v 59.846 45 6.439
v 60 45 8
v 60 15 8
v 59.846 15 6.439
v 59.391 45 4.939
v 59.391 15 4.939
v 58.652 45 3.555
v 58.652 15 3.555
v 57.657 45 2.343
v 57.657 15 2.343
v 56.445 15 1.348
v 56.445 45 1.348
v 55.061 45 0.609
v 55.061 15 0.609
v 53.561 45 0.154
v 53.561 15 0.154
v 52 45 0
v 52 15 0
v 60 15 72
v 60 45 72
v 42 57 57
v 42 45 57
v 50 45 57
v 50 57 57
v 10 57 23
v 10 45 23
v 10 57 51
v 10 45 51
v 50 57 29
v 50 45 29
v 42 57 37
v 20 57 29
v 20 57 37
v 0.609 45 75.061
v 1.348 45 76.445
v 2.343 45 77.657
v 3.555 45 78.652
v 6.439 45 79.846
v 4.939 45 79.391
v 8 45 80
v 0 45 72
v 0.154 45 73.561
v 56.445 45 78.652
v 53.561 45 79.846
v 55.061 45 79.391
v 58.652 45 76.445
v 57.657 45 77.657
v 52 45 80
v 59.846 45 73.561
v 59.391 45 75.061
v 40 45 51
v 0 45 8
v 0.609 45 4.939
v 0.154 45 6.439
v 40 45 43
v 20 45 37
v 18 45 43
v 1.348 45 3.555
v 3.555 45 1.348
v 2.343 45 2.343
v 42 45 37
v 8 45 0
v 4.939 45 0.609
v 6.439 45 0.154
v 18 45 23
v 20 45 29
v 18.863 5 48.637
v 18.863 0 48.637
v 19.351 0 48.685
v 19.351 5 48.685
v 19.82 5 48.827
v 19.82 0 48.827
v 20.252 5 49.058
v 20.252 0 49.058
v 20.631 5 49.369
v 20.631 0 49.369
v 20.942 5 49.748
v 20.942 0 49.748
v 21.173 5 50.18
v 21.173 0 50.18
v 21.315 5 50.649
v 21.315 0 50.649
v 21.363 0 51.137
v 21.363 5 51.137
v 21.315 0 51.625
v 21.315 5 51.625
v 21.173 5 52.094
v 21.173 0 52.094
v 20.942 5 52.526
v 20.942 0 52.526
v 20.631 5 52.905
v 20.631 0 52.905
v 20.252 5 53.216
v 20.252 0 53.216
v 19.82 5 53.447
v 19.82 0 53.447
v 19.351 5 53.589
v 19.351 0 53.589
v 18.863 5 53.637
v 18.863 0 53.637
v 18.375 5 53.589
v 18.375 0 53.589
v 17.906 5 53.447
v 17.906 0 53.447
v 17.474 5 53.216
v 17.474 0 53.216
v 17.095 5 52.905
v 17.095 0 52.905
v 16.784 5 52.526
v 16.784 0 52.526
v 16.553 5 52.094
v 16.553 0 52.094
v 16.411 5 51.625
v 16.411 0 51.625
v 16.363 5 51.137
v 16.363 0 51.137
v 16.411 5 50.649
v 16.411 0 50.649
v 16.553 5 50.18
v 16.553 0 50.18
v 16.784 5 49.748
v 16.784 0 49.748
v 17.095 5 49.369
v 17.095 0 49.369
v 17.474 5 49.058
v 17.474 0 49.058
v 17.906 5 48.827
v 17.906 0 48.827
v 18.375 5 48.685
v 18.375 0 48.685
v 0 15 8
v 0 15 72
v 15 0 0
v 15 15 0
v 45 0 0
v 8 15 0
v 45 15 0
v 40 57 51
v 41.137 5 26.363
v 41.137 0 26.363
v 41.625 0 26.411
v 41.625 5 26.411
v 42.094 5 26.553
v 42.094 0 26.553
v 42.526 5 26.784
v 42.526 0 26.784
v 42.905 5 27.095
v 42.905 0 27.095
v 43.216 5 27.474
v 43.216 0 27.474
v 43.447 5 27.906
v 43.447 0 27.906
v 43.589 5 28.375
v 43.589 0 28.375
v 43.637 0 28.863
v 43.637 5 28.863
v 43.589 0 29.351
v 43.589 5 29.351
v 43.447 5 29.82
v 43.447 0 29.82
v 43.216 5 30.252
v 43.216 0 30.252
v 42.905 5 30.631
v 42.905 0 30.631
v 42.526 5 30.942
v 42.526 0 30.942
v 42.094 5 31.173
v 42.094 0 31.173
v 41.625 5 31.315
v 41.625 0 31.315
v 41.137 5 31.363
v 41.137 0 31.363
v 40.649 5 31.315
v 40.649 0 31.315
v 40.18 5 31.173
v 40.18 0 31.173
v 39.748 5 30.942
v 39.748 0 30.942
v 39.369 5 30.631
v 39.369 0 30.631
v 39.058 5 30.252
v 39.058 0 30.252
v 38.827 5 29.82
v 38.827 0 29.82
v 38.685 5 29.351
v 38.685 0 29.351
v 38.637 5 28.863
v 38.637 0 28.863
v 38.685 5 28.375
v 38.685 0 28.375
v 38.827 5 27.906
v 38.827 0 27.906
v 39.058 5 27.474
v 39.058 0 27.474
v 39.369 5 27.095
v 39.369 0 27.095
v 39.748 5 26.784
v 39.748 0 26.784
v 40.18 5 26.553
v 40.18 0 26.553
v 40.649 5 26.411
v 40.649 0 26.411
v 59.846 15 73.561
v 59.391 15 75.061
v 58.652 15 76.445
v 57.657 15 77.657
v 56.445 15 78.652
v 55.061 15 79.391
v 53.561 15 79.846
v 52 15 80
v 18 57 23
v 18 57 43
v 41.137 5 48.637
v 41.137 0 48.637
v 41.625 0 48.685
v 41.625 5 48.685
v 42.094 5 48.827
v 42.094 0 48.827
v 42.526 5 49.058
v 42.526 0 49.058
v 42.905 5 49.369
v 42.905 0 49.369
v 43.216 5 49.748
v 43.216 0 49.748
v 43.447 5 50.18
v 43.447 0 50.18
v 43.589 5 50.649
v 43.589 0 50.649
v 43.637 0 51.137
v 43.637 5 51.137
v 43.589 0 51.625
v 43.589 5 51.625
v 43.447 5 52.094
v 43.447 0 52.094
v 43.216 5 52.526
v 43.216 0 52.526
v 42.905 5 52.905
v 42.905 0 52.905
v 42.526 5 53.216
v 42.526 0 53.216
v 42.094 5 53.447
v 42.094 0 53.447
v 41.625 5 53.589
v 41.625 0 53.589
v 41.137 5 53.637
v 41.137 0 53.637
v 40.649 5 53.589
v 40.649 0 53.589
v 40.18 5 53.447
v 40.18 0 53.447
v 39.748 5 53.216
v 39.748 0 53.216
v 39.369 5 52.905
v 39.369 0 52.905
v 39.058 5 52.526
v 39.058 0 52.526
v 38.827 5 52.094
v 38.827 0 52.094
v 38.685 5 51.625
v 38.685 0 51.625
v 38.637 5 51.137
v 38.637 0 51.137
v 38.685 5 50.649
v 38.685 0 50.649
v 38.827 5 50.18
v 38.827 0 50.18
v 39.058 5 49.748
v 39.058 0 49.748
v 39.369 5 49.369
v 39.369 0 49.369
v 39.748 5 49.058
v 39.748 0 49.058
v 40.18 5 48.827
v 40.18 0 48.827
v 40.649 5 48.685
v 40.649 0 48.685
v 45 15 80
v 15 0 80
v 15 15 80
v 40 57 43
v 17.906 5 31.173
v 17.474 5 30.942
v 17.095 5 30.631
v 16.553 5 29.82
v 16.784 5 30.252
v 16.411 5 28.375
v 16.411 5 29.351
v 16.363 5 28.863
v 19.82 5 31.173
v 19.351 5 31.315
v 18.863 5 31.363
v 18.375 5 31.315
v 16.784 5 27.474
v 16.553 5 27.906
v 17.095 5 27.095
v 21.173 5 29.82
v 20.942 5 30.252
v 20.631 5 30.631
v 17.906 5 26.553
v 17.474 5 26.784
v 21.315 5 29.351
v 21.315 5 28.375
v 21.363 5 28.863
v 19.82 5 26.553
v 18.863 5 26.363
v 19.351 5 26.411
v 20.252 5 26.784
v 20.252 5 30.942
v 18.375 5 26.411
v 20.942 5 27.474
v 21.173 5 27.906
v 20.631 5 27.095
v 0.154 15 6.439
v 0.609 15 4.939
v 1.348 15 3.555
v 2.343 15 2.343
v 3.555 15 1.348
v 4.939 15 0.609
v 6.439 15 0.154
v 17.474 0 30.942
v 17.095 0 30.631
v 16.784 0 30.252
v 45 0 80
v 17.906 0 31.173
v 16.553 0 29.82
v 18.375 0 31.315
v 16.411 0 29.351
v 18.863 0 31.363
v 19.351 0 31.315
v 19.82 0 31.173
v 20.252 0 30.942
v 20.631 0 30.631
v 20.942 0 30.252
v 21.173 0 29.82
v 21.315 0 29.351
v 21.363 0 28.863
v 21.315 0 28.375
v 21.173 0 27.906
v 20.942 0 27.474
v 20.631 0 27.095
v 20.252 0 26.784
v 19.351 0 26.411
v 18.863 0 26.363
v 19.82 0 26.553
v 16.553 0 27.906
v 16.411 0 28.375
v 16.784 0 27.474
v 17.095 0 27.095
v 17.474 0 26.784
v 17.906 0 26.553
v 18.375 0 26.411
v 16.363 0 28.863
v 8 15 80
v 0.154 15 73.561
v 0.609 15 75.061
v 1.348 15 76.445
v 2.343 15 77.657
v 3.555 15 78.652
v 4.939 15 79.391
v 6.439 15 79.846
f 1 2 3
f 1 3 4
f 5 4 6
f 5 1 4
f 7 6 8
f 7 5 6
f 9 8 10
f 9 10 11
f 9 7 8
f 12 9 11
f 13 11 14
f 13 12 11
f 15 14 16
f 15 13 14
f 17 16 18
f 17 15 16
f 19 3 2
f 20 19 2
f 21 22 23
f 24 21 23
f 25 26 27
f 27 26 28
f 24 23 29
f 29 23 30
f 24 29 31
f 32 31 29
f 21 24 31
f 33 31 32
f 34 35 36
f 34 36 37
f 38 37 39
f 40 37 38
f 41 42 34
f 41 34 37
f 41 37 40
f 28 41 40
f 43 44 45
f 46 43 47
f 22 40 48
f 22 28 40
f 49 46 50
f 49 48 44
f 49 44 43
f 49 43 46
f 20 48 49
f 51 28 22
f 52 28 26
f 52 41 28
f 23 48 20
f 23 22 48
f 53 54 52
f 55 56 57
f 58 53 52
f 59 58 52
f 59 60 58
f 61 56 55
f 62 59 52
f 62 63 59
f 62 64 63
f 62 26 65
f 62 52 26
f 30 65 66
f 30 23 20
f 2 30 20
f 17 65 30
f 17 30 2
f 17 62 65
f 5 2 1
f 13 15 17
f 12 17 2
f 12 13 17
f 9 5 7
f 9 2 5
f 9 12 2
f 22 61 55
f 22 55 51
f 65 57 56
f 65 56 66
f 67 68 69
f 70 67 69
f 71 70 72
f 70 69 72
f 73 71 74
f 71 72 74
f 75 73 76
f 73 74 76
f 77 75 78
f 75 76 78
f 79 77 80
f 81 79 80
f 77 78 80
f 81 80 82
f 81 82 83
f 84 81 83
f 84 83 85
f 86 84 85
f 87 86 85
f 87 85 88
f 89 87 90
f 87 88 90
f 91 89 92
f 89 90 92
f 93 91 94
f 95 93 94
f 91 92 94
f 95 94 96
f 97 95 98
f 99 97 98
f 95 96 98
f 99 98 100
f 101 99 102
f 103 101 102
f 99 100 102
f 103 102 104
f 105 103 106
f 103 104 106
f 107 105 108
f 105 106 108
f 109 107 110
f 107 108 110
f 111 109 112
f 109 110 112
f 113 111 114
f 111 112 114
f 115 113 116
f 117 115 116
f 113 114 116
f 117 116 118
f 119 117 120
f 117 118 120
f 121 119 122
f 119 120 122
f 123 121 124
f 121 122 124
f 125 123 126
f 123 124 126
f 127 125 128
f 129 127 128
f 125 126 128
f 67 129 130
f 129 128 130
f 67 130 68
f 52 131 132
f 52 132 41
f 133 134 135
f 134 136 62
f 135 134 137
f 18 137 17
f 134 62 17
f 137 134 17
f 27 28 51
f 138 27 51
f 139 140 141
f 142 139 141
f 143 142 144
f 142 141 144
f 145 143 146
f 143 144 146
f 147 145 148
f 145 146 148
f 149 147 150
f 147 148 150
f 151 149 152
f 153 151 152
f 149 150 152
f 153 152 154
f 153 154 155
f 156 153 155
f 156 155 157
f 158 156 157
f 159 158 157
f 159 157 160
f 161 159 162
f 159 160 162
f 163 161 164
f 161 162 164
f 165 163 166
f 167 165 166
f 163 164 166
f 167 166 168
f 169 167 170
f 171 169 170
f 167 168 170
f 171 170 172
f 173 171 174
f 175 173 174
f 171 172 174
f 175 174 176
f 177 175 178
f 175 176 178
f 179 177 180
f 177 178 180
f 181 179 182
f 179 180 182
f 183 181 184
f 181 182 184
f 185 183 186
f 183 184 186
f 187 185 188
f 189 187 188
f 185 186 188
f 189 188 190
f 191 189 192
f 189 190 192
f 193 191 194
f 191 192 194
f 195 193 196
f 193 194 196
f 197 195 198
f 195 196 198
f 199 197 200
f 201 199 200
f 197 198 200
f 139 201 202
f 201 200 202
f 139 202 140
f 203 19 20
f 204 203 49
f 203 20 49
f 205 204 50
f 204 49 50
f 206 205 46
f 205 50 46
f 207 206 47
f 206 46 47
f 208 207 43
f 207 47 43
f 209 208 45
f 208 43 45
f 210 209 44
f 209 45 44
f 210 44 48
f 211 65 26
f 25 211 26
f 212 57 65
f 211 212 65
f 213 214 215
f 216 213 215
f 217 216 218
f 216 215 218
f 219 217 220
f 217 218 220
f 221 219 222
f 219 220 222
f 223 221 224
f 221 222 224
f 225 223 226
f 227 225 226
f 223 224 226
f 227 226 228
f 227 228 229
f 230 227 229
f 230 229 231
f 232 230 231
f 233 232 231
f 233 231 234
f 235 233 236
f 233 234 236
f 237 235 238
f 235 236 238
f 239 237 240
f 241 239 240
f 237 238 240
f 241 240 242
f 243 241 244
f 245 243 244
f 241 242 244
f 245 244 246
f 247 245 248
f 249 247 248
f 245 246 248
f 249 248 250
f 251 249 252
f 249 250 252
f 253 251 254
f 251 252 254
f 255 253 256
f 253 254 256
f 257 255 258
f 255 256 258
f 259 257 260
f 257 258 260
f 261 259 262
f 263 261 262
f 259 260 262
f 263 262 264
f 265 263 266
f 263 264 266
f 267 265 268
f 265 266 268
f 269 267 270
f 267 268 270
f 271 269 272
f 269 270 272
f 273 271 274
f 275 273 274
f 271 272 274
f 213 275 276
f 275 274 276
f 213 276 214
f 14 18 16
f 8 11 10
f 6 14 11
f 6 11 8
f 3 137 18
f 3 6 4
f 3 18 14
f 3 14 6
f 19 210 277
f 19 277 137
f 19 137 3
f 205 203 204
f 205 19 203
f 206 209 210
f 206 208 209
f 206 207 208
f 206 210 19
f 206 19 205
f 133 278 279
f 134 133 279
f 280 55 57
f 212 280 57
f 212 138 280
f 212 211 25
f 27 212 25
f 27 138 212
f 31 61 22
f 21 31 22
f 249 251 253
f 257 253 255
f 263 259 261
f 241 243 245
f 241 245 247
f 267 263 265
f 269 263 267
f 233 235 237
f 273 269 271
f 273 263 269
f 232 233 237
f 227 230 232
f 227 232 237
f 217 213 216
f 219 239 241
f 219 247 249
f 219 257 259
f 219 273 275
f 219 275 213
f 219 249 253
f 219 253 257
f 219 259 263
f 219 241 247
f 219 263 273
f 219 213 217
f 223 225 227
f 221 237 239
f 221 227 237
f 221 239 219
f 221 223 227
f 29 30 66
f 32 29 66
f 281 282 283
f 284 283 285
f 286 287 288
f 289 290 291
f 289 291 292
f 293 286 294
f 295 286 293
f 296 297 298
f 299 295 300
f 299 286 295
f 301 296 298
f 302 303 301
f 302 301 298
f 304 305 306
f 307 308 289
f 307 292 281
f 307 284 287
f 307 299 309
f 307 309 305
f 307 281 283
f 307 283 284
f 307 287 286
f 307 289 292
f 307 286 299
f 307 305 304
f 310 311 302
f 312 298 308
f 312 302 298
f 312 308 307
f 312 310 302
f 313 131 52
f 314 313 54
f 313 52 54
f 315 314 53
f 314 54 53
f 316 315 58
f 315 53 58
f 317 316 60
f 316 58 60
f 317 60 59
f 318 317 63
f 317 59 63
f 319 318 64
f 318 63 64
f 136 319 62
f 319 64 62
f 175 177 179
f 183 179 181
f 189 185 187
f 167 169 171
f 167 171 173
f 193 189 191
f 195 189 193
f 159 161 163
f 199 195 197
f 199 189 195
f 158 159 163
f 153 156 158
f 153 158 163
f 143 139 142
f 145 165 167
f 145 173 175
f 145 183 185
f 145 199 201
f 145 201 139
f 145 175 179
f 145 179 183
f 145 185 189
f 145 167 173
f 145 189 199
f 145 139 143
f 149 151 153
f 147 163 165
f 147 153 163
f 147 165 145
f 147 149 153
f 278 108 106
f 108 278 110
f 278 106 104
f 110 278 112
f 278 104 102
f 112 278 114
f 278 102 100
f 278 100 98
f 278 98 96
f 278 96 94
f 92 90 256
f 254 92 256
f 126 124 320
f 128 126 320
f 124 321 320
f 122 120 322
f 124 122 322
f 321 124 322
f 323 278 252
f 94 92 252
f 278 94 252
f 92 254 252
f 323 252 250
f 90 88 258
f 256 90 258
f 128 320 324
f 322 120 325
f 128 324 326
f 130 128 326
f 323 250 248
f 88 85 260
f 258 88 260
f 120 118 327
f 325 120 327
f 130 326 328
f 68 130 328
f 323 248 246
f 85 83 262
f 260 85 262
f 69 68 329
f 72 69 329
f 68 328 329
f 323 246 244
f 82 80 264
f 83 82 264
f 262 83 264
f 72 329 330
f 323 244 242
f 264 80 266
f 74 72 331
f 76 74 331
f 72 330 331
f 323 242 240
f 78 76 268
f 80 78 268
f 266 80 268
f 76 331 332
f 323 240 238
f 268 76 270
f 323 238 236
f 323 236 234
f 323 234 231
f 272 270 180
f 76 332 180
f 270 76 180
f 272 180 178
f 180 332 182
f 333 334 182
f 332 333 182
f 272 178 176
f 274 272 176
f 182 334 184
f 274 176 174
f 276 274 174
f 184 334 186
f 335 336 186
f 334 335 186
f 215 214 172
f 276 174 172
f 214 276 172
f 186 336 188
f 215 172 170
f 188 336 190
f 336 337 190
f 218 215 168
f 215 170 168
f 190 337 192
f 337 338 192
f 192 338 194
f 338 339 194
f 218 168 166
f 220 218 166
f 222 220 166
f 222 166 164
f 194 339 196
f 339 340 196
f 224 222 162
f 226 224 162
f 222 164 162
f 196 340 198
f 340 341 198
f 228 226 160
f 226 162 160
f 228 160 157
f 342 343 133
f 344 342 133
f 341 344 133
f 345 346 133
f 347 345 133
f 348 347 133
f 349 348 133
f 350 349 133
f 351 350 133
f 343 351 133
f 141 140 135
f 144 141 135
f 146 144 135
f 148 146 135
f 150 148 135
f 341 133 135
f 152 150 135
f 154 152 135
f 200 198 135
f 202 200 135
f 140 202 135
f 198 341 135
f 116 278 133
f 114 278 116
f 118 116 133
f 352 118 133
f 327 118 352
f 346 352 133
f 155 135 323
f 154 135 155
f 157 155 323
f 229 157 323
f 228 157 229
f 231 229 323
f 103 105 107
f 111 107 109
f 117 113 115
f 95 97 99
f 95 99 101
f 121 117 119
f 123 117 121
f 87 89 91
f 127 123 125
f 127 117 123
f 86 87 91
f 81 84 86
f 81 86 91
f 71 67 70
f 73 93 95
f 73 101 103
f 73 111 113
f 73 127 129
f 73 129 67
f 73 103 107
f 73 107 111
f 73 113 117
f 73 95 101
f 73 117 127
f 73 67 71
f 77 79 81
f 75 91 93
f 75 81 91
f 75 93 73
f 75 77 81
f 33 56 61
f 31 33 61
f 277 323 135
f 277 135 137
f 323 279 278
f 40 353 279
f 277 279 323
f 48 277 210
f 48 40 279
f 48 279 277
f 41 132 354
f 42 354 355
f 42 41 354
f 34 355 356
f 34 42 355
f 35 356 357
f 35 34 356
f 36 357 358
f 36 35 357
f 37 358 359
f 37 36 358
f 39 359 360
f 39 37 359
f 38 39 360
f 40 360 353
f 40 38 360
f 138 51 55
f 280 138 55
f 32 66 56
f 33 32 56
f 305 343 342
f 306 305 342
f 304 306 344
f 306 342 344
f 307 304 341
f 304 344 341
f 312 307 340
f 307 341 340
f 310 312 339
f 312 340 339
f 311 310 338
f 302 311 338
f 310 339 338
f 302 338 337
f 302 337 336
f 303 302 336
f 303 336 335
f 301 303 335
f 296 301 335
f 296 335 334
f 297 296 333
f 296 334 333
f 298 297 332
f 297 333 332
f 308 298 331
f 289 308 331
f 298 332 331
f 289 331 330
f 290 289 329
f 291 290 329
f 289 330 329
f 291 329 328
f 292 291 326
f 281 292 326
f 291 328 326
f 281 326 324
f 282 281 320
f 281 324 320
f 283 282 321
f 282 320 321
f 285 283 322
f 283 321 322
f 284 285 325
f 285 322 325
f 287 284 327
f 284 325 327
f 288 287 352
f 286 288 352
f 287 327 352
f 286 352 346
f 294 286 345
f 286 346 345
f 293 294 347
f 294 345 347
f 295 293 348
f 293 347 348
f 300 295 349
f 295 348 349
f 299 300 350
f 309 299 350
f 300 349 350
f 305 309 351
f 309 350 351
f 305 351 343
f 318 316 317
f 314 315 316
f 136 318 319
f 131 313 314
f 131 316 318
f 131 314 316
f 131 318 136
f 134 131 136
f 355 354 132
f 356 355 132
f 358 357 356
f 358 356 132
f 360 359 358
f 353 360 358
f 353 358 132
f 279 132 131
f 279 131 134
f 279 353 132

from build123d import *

# Parameters (mm, degrees)
SKETCH_1_W          = 60
SKETCH_1_H          = 45
EXTRUDE_1_DEPTH     = 80
FILLET_1_R          = 8
SKETCH_2_W          = 15
SKETCH_2_H          = 15
CUT_EXTRUDE_1_DEPTH = 110.658560997
SKETCH_3_R          = 2.5
CUT_EXTRUDE_2_DEPTH = 5
EXTRUDE_2_DEPTH     = 12


with BuildPart() as part:
    # ｽｹｯﾁ1 → 押し出し1 (new body)
    with BuildSketch(Plane.XY):
        with Locations((30, 22.5)):
            Rectangle(SKETCH_1_W, SKETCH_1_H)
    extrude(amount=EXTRUDE_1_DEPTH)

    # ﾌｨﾚｯﾄ1
    fillet_1_edges = [part.edges().sort_by_distance(p)[0] for p in [
        (60, 22.5, 80),
        (0, 22.5, 80),
        (60, 22.5, 0),
        (0, 22.5, 0),
    ]]
    fillet(fillet_1_edges, radius=FILLET_1_R)

    # ｽｹｯﾁ2 → ｶｯﾄ - 押し出し1 (cut, through all)
    with BuildSketch(Plane.XY.offset(80)):
        with Locations((52.5, 7.5)):
            Rectangle(SKETCH_2_W, SKETCH_2_H)
        with Locations((7.5, 7.5)):
            Rectangle(SKETCH_2_W, SKETCH_2_H)
    extrude(amount=-CUT_EXTRUDE_1_DEPTH, mode=Mode.SUBTRACT)

    # ｽｹｯﾁ3 → ｶｯﾄ - 押し出し2 (cut)
    with BuildSketch(Plane.XZ):
        with Locations(Location((41.136931804, 51.136931804, 0), (0, 0, 270))):
            Circle(SKETCH_3_R)
        with Locations(Location((41.136931804, 28.863068196, 0), (0, 0, 270))):
            Circle(SKETCH_3_R)
        with Locations(Location((18.863068196, 51.136931804, 0), (0, 0, 270))):
            Circle(SKETCH_3_R)
        with Locations(Location((18.863068196, 28.863068196, 0), (0, 0, 270))):
            Circle(SKETCH_3_R)
    extrude(amount=-CUT_EXTRUDE_2_DEPTH, mode=Mode.SUBTRACT)

    # ｽｹｯﾁ4 → 押し出し2 (add)
    with BuildSketch(Plane(origin=(0, 45, 0), x_dir=(-1, 0, 0), z_dir=(0, 1, 0))):
        Polygon((-50, 29), (-20, 29), (-20, 37), (-42, 37), (-42, 57), (-50, 57), align=None)
        Polygon((-10, 23), (-10, 51), (-40, 51), (-40, 43), (-18, 43), (-18, 23), align=None)
    extrude(amount=EXTRUDE_2_DEPTH)


solid = part.part
